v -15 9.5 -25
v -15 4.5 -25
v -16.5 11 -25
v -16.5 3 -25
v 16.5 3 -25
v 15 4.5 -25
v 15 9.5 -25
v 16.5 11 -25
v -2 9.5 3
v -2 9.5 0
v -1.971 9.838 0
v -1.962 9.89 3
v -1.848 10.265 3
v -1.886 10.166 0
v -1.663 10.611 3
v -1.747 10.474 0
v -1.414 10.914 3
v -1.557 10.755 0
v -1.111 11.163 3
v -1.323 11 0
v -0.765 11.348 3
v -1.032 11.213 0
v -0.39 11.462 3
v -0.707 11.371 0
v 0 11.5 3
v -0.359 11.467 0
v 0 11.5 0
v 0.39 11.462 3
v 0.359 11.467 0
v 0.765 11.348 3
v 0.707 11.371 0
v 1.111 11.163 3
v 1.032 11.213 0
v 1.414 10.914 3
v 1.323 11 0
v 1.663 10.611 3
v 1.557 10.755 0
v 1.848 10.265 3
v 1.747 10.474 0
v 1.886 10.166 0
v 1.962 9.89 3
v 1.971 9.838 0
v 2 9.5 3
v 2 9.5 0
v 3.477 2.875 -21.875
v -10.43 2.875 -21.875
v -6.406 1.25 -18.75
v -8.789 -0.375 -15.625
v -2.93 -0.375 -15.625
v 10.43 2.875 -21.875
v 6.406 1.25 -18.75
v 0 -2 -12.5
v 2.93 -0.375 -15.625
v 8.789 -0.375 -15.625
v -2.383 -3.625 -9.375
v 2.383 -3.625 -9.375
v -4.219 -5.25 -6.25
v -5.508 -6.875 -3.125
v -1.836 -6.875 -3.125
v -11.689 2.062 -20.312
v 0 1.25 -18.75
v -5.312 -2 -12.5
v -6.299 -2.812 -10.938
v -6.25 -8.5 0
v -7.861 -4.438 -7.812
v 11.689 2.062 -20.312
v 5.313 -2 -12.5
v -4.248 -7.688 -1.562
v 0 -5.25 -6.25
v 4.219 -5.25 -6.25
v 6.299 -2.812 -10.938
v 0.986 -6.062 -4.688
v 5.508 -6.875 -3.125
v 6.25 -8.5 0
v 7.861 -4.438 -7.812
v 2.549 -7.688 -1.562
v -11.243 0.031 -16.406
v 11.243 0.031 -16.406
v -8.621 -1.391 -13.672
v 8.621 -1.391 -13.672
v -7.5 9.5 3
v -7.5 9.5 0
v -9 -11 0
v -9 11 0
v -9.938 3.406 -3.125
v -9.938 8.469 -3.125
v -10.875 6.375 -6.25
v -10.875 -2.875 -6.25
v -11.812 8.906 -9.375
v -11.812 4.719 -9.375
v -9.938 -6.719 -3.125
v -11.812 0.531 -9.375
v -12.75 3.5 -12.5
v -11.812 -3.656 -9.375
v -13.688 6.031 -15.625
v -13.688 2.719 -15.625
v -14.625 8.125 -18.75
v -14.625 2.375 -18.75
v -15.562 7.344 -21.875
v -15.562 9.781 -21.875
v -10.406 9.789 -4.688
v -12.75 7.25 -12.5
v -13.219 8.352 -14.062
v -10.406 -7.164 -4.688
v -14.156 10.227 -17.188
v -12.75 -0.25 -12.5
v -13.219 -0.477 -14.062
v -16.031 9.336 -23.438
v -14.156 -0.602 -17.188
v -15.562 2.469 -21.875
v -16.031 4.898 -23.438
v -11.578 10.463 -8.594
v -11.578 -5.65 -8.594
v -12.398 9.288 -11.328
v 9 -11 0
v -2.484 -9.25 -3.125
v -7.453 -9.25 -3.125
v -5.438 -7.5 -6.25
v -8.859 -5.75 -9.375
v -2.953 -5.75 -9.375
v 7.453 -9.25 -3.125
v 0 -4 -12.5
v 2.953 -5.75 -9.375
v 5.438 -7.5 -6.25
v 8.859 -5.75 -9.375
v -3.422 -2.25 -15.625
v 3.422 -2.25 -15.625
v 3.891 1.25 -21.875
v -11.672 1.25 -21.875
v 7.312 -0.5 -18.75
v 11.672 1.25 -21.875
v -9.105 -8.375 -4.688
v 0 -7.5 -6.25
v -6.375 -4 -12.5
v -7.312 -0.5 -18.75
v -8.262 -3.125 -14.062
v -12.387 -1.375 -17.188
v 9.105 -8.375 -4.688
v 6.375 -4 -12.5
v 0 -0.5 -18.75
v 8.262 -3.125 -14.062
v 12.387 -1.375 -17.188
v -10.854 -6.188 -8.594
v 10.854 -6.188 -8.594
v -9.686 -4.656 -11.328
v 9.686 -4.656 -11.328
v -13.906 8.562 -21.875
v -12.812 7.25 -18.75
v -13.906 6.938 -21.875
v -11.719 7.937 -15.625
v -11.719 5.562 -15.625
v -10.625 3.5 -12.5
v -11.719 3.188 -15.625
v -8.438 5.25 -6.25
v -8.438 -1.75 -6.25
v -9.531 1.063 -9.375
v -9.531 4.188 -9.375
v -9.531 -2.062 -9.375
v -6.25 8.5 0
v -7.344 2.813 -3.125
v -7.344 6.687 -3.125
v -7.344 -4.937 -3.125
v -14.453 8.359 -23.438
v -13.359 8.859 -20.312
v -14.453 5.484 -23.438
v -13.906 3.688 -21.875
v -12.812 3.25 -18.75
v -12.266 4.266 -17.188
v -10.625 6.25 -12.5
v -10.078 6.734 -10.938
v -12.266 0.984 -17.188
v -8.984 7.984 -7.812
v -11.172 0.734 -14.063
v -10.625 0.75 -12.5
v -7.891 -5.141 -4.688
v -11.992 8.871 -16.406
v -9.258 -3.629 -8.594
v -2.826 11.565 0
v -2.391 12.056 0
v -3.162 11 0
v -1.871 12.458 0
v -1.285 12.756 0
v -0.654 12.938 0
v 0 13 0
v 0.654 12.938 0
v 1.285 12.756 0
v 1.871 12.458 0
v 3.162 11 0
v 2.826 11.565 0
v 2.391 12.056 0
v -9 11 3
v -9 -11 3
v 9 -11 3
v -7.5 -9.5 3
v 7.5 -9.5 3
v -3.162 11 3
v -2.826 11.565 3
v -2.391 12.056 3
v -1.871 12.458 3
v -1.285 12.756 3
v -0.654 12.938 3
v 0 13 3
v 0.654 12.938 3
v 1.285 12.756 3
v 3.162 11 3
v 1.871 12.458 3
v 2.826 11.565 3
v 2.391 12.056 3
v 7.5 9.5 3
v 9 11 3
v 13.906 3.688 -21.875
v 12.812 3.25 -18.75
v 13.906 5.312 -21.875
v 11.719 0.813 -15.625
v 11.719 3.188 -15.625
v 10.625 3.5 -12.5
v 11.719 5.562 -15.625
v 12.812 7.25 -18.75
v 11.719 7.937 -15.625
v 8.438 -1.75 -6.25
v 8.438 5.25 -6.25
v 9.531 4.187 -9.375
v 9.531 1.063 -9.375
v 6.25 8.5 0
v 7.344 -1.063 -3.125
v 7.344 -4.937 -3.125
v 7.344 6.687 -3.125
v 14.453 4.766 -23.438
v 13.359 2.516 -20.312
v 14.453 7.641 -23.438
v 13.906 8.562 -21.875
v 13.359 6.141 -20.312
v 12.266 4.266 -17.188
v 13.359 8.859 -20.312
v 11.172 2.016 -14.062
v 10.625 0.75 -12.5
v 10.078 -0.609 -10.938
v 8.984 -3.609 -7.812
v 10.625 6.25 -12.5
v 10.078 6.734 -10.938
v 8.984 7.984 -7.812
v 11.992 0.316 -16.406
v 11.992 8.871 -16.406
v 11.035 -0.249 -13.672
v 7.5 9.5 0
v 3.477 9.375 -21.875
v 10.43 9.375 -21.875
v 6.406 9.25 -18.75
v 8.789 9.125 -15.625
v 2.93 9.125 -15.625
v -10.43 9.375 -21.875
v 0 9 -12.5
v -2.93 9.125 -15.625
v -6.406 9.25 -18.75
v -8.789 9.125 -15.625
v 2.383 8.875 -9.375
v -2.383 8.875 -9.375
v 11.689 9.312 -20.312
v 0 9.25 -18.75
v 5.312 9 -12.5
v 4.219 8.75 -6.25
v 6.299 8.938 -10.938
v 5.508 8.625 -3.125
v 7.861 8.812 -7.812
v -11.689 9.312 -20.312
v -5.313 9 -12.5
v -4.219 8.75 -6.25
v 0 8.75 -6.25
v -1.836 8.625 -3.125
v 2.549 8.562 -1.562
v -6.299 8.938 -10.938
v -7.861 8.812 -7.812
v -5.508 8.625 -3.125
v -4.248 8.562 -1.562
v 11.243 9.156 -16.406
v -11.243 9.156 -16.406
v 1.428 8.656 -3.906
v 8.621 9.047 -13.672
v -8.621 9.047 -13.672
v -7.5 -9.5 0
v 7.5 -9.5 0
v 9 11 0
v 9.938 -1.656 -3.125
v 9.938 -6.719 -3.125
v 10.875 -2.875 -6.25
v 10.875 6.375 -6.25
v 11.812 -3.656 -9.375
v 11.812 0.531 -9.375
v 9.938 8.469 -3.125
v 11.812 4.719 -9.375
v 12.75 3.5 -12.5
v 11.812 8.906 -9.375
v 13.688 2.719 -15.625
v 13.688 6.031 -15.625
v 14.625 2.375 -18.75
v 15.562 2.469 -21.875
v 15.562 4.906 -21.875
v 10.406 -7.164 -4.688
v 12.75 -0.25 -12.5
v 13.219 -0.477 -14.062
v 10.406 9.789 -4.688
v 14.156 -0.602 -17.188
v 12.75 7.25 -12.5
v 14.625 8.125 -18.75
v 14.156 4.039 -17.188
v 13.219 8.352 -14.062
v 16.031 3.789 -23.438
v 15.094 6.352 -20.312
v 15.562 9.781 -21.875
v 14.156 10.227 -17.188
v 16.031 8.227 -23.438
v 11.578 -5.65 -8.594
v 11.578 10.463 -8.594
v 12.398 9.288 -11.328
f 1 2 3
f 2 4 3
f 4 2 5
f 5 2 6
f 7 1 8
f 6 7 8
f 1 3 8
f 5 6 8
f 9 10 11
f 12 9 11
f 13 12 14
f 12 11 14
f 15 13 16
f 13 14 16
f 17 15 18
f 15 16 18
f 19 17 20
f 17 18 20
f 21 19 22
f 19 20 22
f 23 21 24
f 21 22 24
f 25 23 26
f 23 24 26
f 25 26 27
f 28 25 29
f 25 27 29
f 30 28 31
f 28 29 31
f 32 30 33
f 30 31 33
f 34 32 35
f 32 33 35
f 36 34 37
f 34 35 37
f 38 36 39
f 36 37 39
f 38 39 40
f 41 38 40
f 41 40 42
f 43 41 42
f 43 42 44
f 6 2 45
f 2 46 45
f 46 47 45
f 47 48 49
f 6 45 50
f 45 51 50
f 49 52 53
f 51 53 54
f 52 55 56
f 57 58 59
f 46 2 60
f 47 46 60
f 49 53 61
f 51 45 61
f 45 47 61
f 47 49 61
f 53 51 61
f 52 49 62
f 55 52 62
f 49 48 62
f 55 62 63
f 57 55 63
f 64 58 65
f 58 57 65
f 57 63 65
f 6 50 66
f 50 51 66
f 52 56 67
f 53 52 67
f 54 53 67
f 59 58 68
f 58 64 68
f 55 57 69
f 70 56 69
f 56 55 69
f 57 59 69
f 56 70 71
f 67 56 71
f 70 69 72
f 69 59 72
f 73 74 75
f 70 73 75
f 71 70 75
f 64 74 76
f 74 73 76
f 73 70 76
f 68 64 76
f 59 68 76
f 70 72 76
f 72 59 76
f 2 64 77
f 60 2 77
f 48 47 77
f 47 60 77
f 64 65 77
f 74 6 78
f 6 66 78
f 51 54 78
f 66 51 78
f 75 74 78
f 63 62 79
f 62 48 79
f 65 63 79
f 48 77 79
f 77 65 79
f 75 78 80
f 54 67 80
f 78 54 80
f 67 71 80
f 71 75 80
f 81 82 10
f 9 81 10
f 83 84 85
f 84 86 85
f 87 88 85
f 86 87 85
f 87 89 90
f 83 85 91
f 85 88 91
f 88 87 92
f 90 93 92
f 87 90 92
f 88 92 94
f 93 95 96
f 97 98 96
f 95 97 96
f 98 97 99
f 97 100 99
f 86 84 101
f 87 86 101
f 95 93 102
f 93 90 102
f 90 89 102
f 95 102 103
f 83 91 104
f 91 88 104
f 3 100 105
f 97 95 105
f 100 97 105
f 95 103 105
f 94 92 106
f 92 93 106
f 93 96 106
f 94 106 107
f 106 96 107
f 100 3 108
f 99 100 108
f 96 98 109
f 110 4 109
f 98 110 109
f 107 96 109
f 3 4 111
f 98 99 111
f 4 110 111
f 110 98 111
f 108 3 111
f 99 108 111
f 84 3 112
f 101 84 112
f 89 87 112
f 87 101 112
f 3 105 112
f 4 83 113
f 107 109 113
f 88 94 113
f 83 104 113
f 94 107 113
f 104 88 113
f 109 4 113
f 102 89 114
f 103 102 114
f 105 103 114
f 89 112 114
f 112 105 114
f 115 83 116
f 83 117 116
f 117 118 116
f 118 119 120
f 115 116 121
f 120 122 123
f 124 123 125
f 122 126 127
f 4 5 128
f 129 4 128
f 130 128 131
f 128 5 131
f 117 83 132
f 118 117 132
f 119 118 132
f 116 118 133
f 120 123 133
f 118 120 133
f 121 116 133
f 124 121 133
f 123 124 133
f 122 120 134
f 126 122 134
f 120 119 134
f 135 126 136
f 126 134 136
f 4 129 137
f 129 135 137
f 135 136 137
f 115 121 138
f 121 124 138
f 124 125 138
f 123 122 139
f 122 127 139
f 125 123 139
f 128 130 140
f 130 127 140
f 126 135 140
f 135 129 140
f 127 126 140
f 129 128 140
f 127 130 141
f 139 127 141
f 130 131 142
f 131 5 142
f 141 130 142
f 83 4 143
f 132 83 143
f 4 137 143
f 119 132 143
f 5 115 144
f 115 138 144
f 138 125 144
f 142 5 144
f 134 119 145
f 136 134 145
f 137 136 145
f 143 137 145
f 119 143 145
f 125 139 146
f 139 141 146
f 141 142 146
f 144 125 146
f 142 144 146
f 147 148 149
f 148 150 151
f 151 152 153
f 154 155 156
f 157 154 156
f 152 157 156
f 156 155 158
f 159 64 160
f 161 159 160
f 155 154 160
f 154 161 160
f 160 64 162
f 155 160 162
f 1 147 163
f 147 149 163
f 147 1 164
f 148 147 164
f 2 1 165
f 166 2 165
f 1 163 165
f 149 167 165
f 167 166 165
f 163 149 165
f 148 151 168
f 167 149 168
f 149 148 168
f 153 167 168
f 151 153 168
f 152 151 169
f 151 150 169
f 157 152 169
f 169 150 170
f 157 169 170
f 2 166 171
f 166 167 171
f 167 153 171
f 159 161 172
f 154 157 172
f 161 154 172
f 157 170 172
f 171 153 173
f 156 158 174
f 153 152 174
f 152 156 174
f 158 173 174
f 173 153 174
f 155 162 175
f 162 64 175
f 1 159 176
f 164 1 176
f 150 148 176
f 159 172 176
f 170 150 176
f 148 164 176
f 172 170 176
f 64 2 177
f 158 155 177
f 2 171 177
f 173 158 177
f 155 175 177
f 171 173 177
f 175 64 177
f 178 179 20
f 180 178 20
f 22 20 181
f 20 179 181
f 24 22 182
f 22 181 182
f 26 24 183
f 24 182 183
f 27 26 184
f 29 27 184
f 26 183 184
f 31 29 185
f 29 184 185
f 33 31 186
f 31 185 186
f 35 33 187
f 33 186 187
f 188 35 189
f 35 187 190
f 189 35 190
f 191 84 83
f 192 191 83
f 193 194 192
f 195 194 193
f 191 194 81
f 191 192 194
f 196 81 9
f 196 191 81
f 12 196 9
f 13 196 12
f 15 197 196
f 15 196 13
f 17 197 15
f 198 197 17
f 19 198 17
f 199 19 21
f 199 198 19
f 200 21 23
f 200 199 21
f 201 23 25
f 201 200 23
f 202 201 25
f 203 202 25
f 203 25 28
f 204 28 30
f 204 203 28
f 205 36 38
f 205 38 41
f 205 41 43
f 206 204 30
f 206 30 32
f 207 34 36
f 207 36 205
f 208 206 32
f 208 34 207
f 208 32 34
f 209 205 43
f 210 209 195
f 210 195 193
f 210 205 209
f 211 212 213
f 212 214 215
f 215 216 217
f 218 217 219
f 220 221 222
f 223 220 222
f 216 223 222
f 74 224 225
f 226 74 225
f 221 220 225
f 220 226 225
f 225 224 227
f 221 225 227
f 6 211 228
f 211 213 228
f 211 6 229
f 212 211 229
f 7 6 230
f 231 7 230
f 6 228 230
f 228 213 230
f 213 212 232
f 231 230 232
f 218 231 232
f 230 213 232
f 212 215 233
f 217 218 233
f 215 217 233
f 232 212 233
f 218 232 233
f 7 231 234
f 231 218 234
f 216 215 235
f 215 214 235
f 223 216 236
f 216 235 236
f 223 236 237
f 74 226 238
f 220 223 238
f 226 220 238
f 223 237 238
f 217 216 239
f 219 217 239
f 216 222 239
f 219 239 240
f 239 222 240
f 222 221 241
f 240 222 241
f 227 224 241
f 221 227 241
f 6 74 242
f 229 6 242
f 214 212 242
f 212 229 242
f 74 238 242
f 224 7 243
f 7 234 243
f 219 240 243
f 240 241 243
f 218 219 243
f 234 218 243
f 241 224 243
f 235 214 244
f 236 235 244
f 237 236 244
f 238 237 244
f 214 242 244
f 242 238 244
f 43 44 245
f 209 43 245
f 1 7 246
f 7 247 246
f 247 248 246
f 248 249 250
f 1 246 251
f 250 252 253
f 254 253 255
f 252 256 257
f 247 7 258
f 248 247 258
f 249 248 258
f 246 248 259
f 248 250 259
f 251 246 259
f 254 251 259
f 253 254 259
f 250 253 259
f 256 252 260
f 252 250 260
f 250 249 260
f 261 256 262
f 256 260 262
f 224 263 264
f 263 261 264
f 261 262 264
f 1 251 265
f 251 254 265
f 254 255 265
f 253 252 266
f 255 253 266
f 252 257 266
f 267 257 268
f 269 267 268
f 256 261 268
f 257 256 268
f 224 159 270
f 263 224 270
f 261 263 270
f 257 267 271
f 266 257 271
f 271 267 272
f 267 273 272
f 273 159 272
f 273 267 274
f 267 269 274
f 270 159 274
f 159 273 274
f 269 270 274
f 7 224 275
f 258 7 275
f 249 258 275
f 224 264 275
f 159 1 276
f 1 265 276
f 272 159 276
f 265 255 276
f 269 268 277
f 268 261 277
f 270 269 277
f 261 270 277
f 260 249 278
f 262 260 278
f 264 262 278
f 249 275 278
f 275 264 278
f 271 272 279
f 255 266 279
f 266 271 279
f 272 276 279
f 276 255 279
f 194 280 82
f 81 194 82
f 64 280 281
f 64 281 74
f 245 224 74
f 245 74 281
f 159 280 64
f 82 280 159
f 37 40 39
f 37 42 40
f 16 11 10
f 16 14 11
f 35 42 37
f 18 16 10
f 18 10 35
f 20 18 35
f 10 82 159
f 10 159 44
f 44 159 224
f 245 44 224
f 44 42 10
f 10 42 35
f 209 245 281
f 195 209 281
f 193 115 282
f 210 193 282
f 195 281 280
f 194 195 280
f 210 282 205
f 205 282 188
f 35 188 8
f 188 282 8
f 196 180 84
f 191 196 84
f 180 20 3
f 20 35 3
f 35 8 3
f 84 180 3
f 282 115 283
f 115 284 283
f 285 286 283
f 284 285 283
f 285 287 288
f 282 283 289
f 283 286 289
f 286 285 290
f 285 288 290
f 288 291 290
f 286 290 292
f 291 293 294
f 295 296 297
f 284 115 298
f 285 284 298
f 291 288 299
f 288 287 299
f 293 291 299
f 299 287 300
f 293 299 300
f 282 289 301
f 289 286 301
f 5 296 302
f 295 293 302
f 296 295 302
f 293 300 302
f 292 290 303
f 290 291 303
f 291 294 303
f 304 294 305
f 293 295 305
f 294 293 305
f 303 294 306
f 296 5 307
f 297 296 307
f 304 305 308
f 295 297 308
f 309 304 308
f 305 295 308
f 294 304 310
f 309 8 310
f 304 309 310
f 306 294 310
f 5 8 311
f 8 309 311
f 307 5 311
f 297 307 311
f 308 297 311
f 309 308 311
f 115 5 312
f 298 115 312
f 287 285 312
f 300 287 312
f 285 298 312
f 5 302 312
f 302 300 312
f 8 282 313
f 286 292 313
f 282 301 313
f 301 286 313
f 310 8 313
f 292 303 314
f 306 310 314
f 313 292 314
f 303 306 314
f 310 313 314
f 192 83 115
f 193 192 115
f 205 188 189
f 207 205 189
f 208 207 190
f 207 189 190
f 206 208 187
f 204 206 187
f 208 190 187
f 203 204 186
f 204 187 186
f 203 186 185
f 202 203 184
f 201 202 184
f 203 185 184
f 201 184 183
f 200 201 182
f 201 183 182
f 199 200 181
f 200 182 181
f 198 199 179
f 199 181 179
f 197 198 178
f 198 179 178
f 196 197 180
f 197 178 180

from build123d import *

# Parameters (mm, degrees)
F2_DEPTH = 3
F3_W     = 18
F3_H     = 22
F5_W     = 33
F5_H     = 8
F7_W     = 30
F7_H     = 5
F6_W     = 12.5
F6_H     = 17


with BuildPart() as f2:
    # F1 (on Top) → F2 (new body)
    with BuildSketch(Plane.XY):
        with BuildLine():
            Line((-9, -11), (9, -11))
            Line((9, -11), (9, 11))
            Line((9, 11), (3.1622776602, 11))
            ThreePointArc((3.1622776602, 11), (0, 13), (-3.1622776602, 11))
            Line((-3.1622776602, 11), (-9, 11))
            Line((-9, 11), (-9, -11))
        make_face()
        with BuildLine():
            Line((7.5, 9.5), (7.5, -9.5))
            Line((7.5, -9.5), (-7.5, -9.5))
            Line((-7.5, -9.5), (-7.5, 9.5))
            Line((-7.5, 9.5), (-2, 9.5))
            ThreePointArc((-2, 9.5), (0, 11.5), (2, 9.5))
            Line((2, 9.5), (7.5, 9.5))
        make_face(mode=Mode.SUBTRACT)
    extrude(amount=F2_DEPTH)

    # F3 (on Top) → F8 section 0
    with BuildSketch(Plane.XY):
        Rectangle(F3_W, F3_H)
    # F5 (on offset) → F8 section 1
    with BuildSketch(Plane.XY.offset(-25)):
        with Locations((0, 7)):
            Rectangle(F5_W, F5_H)
    loft()

    # F7 (on face) → F9 section 0
    with BuildSketch(Plane.XY.offset(-25)):
        with Locations((0, 7)):
            Rectangle(F7_W, F7_H)
    # F6 (on face) → F9 section 1
    with BuildSketch(Plane.XY):
        Rectangle(F6_W, F6_H)
    loft(mode=Mode.SUBTRACT)


solid = f2.part
